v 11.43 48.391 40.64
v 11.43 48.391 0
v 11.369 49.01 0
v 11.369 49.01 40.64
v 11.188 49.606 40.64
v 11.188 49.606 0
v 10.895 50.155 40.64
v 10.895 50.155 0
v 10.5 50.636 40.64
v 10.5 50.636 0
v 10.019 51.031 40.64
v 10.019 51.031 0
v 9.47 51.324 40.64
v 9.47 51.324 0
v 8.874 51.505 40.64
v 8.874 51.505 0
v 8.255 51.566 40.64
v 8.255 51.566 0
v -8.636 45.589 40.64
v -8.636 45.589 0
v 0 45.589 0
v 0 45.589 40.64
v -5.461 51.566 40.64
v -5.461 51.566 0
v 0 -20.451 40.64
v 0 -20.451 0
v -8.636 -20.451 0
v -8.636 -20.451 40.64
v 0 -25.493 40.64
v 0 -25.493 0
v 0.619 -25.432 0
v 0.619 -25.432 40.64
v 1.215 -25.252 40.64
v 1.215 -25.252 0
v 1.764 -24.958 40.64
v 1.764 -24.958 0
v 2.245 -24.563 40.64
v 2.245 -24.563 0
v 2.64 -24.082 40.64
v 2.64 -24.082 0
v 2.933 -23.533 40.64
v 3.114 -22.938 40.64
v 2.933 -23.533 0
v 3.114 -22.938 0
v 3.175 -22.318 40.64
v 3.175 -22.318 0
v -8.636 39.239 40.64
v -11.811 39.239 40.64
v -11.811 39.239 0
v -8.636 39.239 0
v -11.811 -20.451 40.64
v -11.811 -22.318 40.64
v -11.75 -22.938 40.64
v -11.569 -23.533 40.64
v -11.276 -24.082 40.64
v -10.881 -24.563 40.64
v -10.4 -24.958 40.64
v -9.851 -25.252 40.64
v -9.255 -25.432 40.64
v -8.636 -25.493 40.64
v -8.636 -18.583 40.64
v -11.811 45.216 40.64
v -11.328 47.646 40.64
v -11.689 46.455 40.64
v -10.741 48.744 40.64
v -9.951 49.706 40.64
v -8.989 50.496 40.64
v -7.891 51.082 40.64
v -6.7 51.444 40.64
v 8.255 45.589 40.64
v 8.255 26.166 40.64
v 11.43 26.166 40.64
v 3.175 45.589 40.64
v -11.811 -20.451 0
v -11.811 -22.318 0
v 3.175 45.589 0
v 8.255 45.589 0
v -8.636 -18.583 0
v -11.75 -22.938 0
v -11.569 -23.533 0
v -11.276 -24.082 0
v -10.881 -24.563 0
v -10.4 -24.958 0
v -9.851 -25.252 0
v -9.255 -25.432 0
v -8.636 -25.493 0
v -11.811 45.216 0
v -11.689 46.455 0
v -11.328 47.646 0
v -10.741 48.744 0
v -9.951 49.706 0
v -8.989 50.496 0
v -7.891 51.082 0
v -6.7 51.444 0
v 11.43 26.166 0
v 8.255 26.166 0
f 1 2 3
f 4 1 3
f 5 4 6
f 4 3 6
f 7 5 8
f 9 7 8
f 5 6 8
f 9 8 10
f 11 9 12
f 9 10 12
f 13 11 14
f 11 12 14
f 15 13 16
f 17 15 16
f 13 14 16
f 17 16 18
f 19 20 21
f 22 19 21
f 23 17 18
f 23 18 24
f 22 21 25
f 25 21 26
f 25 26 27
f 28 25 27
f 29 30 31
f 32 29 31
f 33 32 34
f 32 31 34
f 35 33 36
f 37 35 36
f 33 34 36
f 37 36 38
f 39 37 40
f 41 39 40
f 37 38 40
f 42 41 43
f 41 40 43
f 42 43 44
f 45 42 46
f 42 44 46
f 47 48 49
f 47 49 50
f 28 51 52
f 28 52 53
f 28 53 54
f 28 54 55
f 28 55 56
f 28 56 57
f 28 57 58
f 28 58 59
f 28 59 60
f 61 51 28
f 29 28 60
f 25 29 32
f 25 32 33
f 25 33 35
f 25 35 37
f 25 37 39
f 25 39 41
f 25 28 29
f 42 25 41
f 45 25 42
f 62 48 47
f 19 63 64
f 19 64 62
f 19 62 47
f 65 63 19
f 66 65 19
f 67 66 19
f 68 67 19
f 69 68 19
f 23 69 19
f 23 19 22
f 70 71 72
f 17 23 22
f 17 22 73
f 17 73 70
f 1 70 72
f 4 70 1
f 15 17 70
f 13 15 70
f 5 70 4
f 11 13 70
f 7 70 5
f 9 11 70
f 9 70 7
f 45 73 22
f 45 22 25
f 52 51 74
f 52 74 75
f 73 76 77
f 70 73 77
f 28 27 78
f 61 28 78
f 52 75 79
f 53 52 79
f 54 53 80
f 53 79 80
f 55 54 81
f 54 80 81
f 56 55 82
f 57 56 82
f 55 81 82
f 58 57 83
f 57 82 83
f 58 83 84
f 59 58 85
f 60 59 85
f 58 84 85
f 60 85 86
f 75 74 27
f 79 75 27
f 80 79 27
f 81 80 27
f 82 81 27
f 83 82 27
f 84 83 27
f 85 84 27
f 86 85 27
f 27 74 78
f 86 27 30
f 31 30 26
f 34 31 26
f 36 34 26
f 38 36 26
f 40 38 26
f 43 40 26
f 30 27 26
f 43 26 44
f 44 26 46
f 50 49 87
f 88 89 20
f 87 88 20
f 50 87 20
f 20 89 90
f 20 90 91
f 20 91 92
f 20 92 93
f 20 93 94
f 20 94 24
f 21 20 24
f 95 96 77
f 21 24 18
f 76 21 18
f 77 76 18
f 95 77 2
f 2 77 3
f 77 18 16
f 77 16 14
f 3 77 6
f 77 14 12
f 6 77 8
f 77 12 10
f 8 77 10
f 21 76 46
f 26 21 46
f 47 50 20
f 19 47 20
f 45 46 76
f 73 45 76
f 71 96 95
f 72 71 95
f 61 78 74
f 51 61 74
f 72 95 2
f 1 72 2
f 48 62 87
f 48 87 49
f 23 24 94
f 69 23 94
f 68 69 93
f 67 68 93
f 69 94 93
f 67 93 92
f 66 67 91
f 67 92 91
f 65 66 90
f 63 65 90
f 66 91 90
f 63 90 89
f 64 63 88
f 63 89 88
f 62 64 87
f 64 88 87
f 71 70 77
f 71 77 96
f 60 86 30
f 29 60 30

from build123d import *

# Parameters (mm, degrees)
F1_DEPTH = 40.64


with BuildPart() as f1:
    # F0 (on Top) → F1 (new body)
    with BuildSketch(Plane.XY):
        with BuildLine():
            Line((0, 45.589266), (0, -20.450734))
            Line((0, -20.450734), (-8.636, -20.450734))
            Line((-8.636, -20.450734), (-8.636, -18.583086))
            Line((-8.636, -18.583086), (-11.811, -20.450734))
            Line((-11.811, -20.450734), (-11.811, -22.318379))
            ThreePointArc((-11.811, -22.318379), (-10.881064, -24.563443), (-8.636, -25.493379))
            Line((-8.636, -25.493379), (0, -25.493379))
            ThreePointArc((0, -25.493379), (2.245064, -24.563443), (3.175, -22.318379))
            Line((3.175, -22.318379), (3.175, -20.450734))
            Line((3.175, -20.450734), (3.175, 45.589266))
            Line((3.175, 45.589266), (8.255, 45.589266))
            Line((8.255, 45.589266), (8.255, 26.165736))
            Line((8.255, 26.165736), (11.43, 26.165736))
            Line((11.43, 26.165736), (11.43, 48.390736))
            ThreePointArc((11.43, 48.390736), (10.500064, 50.6358), (8.255, 51.565736))
            Line((8.255, 51.565736), (3.175, 51.565736))
            Line((3.175, 51.565736), (0, 51.565736))
            Line((0, 51.565736), (-5.461, 51.565736))
            ThreePointArc((-5.461, 51.565736), (-9.951128, 49.705865), (-11.811, 45.215736))
            Line((-11.811, 45.215736), (-11.811, 39.239265))
            Line((-11.811, 39.239265), (-8.636, 39.239265))
            Line((-8.636, 39.239265), (-8.636, 45.589266))
            Line((-8.636, 45.589266), (0, 45.589266))
        make_face()
    extrude(amount=F1_DEPTH)


solid = f1.part
